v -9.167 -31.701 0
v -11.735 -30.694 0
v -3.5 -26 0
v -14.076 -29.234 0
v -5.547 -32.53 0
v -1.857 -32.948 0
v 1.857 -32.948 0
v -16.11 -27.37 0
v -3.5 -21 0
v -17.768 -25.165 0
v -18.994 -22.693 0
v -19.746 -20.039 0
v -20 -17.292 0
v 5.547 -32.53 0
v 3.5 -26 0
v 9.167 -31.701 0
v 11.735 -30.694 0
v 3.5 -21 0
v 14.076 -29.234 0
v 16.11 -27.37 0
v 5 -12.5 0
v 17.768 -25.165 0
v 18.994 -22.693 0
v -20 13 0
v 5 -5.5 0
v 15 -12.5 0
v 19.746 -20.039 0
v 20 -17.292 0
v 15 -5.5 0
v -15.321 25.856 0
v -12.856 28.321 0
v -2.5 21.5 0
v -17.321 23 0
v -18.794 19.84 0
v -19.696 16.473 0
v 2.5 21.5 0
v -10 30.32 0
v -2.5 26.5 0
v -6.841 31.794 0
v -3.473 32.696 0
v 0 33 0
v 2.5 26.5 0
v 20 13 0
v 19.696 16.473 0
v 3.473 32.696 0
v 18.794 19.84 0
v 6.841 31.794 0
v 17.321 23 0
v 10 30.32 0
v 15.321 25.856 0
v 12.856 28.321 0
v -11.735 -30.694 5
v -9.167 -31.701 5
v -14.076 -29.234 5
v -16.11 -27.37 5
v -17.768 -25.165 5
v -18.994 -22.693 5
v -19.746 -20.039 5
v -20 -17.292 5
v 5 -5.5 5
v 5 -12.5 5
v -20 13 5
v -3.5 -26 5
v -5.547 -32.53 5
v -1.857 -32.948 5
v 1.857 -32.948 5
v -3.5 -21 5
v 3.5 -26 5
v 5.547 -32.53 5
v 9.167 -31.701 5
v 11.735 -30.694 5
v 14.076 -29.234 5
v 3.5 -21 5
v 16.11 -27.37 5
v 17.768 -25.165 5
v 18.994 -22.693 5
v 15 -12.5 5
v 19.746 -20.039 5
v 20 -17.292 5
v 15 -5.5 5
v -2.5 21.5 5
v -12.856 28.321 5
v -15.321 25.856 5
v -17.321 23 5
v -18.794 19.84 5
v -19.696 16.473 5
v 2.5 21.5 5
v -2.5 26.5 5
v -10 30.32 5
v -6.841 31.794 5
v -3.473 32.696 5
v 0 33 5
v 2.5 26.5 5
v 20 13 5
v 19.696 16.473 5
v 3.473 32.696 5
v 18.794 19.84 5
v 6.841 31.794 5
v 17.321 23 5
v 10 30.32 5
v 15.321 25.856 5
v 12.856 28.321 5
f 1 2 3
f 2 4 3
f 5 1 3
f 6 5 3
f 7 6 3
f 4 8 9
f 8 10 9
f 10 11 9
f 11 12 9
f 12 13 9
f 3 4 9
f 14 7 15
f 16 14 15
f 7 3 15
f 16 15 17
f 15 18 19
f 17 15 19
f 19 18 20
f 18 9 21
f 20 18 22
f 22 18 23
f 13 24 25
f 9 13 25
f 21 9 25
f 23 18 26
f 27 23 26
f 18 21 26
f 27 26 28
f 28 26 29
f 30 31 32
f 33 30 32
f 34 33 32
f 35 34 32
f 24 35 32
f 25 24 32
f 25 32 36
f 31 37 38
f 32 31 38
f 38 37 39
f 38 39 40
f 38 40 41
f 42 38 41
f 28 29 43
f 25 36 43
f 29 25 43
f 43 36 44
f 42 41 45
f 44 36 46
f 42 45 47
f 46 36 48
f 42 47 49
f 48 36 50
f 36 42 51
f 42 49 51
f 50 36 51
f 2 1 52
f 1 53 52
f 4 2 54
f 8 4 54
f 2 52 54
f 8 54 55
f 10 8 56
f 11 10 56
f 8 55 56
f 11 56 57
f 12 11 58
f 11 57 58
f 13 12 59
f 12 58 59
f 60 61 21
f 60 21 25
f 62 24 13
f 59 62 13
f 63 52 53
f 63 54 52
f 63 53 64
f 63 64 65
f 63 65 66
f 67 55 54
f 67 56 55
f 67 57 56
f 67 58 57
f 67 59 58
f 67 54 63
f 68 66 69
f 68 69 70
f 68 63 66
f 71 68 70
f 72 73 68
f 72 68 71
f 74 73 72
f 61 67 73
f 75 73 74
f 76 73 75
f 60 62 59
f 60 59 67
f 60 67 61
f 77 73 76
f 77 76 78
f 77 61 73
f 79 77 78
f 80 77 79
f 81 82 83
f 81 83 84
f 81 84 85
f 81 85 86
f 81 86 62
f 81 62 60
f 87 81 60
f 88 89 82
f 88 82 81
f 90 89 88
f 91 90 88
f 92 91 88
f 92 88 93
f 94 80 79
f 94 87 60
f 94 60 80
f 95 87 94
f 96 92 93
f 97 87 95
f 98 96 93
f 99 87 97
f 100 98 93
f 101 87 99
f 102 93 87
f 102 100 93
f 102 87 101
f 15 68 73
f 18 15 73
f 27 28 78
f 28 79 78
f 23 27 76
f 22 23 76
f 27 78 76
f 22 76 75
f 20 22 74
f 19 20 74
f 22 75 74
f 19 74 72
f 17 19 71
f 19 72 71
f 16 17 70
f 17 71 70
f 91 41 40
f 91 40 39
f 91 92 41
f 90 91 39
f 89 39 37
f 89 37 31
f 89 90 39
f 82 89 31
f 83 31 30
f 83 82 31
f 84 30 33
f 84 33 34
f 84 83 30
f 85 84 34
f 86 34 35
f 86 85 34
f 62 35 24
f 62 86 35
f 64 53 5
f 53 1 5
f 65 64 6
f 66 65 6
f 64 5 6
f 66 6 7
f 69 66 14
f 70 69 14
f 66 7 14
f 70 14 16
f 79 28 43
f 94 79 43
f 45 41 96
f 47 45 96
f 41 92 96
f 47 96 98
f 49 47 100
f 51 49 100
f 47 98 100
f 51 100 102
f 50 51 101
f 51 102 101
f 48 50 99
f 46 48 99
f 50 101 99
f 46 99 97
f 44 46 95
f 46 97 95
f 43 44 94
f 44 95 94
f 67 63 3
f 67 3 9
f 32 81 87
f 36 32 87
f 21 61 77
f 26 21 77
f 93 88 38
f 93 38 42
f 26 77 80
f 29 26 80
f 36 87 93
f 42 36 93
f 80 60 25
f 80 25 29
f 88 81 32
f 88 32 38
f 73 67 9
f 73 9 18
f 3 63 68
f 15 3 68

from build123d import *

# Parameters (mm, degrees)
SKETCH1_R           = 33
BOSS_EXTRUDE1_DEPTH = 5
CUT_EXTRUDE3_START  = -10
CUT_EXTRUDE3_DEPTH  = 10
FILLET2_R           = 20
FILLET3_R           = 15
SKETCH7_W           = 5
SKETCH7_H           = 5
SKETCH7_W_2         = 7
CUT_EXTRUDE4_DEPTH  = 10
SKETCH8_W           = 10
SKETCH8_H           = 7
CUT_EXTRUDE5_DEPTH  = 10


with BuildPart() as part:
    # Sketch1 → Boss-Extrude1 (new body)
    with BuildSketch(Plane.XY):
        Circle(SKETCH1_R)
    extrude(amount=BOSS_EXTRUDE1_DEPTH)

    # Sketch6 → Cut-Extrude3 (cut)
    with BuildSketch(Plane.XY.offset(5).offset(CUT_EXTRUDE3_START)):
        with BuildLine():
            Line((-20, 26.248809497), (-20, -26.248809497))
            ThreePointArc((-20, -26.248809497), (-33, 0), (-20, 26.248809497))
        make_face()
        with BuildLine():
            Line((20, -26.248809497), (20, 26.248809497))
            ThreePointArc((20, 26.248809497), (33, 0), (20, -26.248809497))
        make_face()
    extrude(amount=CUT_EXTRUDE3_DEPTH, mode=Mode.SUBTRACT)

    # Fillet2
    fillet2_edges = [part.edges().sort_by_distance(p)[0] for p in [
        (-20, 26.248809497, 2.5),
        (20, 26.248809497, 2.5),
    ]]
    fillet(fillet2_edges, radius=FILLET2_R - 0.0001)  # a hair under: the kernel refuses the full size

    # Fillet3
    fillet3_edges = [part.edges().sort_by_distance(p)[0] for p in [
        (-20, -26.248809497, 2.5),
        (20, -26.248809497, 2.5),
    ]]
    fillet(fillet3_edges, radius=FILLET3_R)

    # Sketch7 → Cut-Extrude4 (cut)
    with BuildSketch(Plane.XY.offset(5)):
        with Locations((0, 24)):
            Rectangle(SKETCH7_W, SKETCH7_H)
        with Locations((0, -23.5)):
            Rectangle(SKETCH7_W_2, SKETCH7_H)
    extrude(amount=-CUT_EXTRUDE4_DEPTH, mode=Mode.SUBTRACT)

    # Sketch8 → Cut-Extrude5 (cut)
    with BuildSketch(Plane.XY.offset(5)):
        with Locations((10, -9)):
            Rectangle(SKETCH8_W, SKETCH8_H)
    extrude(amount=-CUT_EXTRUDE5_DEPTH, mode=Mode.SUBTRACT)


solid = part.part
